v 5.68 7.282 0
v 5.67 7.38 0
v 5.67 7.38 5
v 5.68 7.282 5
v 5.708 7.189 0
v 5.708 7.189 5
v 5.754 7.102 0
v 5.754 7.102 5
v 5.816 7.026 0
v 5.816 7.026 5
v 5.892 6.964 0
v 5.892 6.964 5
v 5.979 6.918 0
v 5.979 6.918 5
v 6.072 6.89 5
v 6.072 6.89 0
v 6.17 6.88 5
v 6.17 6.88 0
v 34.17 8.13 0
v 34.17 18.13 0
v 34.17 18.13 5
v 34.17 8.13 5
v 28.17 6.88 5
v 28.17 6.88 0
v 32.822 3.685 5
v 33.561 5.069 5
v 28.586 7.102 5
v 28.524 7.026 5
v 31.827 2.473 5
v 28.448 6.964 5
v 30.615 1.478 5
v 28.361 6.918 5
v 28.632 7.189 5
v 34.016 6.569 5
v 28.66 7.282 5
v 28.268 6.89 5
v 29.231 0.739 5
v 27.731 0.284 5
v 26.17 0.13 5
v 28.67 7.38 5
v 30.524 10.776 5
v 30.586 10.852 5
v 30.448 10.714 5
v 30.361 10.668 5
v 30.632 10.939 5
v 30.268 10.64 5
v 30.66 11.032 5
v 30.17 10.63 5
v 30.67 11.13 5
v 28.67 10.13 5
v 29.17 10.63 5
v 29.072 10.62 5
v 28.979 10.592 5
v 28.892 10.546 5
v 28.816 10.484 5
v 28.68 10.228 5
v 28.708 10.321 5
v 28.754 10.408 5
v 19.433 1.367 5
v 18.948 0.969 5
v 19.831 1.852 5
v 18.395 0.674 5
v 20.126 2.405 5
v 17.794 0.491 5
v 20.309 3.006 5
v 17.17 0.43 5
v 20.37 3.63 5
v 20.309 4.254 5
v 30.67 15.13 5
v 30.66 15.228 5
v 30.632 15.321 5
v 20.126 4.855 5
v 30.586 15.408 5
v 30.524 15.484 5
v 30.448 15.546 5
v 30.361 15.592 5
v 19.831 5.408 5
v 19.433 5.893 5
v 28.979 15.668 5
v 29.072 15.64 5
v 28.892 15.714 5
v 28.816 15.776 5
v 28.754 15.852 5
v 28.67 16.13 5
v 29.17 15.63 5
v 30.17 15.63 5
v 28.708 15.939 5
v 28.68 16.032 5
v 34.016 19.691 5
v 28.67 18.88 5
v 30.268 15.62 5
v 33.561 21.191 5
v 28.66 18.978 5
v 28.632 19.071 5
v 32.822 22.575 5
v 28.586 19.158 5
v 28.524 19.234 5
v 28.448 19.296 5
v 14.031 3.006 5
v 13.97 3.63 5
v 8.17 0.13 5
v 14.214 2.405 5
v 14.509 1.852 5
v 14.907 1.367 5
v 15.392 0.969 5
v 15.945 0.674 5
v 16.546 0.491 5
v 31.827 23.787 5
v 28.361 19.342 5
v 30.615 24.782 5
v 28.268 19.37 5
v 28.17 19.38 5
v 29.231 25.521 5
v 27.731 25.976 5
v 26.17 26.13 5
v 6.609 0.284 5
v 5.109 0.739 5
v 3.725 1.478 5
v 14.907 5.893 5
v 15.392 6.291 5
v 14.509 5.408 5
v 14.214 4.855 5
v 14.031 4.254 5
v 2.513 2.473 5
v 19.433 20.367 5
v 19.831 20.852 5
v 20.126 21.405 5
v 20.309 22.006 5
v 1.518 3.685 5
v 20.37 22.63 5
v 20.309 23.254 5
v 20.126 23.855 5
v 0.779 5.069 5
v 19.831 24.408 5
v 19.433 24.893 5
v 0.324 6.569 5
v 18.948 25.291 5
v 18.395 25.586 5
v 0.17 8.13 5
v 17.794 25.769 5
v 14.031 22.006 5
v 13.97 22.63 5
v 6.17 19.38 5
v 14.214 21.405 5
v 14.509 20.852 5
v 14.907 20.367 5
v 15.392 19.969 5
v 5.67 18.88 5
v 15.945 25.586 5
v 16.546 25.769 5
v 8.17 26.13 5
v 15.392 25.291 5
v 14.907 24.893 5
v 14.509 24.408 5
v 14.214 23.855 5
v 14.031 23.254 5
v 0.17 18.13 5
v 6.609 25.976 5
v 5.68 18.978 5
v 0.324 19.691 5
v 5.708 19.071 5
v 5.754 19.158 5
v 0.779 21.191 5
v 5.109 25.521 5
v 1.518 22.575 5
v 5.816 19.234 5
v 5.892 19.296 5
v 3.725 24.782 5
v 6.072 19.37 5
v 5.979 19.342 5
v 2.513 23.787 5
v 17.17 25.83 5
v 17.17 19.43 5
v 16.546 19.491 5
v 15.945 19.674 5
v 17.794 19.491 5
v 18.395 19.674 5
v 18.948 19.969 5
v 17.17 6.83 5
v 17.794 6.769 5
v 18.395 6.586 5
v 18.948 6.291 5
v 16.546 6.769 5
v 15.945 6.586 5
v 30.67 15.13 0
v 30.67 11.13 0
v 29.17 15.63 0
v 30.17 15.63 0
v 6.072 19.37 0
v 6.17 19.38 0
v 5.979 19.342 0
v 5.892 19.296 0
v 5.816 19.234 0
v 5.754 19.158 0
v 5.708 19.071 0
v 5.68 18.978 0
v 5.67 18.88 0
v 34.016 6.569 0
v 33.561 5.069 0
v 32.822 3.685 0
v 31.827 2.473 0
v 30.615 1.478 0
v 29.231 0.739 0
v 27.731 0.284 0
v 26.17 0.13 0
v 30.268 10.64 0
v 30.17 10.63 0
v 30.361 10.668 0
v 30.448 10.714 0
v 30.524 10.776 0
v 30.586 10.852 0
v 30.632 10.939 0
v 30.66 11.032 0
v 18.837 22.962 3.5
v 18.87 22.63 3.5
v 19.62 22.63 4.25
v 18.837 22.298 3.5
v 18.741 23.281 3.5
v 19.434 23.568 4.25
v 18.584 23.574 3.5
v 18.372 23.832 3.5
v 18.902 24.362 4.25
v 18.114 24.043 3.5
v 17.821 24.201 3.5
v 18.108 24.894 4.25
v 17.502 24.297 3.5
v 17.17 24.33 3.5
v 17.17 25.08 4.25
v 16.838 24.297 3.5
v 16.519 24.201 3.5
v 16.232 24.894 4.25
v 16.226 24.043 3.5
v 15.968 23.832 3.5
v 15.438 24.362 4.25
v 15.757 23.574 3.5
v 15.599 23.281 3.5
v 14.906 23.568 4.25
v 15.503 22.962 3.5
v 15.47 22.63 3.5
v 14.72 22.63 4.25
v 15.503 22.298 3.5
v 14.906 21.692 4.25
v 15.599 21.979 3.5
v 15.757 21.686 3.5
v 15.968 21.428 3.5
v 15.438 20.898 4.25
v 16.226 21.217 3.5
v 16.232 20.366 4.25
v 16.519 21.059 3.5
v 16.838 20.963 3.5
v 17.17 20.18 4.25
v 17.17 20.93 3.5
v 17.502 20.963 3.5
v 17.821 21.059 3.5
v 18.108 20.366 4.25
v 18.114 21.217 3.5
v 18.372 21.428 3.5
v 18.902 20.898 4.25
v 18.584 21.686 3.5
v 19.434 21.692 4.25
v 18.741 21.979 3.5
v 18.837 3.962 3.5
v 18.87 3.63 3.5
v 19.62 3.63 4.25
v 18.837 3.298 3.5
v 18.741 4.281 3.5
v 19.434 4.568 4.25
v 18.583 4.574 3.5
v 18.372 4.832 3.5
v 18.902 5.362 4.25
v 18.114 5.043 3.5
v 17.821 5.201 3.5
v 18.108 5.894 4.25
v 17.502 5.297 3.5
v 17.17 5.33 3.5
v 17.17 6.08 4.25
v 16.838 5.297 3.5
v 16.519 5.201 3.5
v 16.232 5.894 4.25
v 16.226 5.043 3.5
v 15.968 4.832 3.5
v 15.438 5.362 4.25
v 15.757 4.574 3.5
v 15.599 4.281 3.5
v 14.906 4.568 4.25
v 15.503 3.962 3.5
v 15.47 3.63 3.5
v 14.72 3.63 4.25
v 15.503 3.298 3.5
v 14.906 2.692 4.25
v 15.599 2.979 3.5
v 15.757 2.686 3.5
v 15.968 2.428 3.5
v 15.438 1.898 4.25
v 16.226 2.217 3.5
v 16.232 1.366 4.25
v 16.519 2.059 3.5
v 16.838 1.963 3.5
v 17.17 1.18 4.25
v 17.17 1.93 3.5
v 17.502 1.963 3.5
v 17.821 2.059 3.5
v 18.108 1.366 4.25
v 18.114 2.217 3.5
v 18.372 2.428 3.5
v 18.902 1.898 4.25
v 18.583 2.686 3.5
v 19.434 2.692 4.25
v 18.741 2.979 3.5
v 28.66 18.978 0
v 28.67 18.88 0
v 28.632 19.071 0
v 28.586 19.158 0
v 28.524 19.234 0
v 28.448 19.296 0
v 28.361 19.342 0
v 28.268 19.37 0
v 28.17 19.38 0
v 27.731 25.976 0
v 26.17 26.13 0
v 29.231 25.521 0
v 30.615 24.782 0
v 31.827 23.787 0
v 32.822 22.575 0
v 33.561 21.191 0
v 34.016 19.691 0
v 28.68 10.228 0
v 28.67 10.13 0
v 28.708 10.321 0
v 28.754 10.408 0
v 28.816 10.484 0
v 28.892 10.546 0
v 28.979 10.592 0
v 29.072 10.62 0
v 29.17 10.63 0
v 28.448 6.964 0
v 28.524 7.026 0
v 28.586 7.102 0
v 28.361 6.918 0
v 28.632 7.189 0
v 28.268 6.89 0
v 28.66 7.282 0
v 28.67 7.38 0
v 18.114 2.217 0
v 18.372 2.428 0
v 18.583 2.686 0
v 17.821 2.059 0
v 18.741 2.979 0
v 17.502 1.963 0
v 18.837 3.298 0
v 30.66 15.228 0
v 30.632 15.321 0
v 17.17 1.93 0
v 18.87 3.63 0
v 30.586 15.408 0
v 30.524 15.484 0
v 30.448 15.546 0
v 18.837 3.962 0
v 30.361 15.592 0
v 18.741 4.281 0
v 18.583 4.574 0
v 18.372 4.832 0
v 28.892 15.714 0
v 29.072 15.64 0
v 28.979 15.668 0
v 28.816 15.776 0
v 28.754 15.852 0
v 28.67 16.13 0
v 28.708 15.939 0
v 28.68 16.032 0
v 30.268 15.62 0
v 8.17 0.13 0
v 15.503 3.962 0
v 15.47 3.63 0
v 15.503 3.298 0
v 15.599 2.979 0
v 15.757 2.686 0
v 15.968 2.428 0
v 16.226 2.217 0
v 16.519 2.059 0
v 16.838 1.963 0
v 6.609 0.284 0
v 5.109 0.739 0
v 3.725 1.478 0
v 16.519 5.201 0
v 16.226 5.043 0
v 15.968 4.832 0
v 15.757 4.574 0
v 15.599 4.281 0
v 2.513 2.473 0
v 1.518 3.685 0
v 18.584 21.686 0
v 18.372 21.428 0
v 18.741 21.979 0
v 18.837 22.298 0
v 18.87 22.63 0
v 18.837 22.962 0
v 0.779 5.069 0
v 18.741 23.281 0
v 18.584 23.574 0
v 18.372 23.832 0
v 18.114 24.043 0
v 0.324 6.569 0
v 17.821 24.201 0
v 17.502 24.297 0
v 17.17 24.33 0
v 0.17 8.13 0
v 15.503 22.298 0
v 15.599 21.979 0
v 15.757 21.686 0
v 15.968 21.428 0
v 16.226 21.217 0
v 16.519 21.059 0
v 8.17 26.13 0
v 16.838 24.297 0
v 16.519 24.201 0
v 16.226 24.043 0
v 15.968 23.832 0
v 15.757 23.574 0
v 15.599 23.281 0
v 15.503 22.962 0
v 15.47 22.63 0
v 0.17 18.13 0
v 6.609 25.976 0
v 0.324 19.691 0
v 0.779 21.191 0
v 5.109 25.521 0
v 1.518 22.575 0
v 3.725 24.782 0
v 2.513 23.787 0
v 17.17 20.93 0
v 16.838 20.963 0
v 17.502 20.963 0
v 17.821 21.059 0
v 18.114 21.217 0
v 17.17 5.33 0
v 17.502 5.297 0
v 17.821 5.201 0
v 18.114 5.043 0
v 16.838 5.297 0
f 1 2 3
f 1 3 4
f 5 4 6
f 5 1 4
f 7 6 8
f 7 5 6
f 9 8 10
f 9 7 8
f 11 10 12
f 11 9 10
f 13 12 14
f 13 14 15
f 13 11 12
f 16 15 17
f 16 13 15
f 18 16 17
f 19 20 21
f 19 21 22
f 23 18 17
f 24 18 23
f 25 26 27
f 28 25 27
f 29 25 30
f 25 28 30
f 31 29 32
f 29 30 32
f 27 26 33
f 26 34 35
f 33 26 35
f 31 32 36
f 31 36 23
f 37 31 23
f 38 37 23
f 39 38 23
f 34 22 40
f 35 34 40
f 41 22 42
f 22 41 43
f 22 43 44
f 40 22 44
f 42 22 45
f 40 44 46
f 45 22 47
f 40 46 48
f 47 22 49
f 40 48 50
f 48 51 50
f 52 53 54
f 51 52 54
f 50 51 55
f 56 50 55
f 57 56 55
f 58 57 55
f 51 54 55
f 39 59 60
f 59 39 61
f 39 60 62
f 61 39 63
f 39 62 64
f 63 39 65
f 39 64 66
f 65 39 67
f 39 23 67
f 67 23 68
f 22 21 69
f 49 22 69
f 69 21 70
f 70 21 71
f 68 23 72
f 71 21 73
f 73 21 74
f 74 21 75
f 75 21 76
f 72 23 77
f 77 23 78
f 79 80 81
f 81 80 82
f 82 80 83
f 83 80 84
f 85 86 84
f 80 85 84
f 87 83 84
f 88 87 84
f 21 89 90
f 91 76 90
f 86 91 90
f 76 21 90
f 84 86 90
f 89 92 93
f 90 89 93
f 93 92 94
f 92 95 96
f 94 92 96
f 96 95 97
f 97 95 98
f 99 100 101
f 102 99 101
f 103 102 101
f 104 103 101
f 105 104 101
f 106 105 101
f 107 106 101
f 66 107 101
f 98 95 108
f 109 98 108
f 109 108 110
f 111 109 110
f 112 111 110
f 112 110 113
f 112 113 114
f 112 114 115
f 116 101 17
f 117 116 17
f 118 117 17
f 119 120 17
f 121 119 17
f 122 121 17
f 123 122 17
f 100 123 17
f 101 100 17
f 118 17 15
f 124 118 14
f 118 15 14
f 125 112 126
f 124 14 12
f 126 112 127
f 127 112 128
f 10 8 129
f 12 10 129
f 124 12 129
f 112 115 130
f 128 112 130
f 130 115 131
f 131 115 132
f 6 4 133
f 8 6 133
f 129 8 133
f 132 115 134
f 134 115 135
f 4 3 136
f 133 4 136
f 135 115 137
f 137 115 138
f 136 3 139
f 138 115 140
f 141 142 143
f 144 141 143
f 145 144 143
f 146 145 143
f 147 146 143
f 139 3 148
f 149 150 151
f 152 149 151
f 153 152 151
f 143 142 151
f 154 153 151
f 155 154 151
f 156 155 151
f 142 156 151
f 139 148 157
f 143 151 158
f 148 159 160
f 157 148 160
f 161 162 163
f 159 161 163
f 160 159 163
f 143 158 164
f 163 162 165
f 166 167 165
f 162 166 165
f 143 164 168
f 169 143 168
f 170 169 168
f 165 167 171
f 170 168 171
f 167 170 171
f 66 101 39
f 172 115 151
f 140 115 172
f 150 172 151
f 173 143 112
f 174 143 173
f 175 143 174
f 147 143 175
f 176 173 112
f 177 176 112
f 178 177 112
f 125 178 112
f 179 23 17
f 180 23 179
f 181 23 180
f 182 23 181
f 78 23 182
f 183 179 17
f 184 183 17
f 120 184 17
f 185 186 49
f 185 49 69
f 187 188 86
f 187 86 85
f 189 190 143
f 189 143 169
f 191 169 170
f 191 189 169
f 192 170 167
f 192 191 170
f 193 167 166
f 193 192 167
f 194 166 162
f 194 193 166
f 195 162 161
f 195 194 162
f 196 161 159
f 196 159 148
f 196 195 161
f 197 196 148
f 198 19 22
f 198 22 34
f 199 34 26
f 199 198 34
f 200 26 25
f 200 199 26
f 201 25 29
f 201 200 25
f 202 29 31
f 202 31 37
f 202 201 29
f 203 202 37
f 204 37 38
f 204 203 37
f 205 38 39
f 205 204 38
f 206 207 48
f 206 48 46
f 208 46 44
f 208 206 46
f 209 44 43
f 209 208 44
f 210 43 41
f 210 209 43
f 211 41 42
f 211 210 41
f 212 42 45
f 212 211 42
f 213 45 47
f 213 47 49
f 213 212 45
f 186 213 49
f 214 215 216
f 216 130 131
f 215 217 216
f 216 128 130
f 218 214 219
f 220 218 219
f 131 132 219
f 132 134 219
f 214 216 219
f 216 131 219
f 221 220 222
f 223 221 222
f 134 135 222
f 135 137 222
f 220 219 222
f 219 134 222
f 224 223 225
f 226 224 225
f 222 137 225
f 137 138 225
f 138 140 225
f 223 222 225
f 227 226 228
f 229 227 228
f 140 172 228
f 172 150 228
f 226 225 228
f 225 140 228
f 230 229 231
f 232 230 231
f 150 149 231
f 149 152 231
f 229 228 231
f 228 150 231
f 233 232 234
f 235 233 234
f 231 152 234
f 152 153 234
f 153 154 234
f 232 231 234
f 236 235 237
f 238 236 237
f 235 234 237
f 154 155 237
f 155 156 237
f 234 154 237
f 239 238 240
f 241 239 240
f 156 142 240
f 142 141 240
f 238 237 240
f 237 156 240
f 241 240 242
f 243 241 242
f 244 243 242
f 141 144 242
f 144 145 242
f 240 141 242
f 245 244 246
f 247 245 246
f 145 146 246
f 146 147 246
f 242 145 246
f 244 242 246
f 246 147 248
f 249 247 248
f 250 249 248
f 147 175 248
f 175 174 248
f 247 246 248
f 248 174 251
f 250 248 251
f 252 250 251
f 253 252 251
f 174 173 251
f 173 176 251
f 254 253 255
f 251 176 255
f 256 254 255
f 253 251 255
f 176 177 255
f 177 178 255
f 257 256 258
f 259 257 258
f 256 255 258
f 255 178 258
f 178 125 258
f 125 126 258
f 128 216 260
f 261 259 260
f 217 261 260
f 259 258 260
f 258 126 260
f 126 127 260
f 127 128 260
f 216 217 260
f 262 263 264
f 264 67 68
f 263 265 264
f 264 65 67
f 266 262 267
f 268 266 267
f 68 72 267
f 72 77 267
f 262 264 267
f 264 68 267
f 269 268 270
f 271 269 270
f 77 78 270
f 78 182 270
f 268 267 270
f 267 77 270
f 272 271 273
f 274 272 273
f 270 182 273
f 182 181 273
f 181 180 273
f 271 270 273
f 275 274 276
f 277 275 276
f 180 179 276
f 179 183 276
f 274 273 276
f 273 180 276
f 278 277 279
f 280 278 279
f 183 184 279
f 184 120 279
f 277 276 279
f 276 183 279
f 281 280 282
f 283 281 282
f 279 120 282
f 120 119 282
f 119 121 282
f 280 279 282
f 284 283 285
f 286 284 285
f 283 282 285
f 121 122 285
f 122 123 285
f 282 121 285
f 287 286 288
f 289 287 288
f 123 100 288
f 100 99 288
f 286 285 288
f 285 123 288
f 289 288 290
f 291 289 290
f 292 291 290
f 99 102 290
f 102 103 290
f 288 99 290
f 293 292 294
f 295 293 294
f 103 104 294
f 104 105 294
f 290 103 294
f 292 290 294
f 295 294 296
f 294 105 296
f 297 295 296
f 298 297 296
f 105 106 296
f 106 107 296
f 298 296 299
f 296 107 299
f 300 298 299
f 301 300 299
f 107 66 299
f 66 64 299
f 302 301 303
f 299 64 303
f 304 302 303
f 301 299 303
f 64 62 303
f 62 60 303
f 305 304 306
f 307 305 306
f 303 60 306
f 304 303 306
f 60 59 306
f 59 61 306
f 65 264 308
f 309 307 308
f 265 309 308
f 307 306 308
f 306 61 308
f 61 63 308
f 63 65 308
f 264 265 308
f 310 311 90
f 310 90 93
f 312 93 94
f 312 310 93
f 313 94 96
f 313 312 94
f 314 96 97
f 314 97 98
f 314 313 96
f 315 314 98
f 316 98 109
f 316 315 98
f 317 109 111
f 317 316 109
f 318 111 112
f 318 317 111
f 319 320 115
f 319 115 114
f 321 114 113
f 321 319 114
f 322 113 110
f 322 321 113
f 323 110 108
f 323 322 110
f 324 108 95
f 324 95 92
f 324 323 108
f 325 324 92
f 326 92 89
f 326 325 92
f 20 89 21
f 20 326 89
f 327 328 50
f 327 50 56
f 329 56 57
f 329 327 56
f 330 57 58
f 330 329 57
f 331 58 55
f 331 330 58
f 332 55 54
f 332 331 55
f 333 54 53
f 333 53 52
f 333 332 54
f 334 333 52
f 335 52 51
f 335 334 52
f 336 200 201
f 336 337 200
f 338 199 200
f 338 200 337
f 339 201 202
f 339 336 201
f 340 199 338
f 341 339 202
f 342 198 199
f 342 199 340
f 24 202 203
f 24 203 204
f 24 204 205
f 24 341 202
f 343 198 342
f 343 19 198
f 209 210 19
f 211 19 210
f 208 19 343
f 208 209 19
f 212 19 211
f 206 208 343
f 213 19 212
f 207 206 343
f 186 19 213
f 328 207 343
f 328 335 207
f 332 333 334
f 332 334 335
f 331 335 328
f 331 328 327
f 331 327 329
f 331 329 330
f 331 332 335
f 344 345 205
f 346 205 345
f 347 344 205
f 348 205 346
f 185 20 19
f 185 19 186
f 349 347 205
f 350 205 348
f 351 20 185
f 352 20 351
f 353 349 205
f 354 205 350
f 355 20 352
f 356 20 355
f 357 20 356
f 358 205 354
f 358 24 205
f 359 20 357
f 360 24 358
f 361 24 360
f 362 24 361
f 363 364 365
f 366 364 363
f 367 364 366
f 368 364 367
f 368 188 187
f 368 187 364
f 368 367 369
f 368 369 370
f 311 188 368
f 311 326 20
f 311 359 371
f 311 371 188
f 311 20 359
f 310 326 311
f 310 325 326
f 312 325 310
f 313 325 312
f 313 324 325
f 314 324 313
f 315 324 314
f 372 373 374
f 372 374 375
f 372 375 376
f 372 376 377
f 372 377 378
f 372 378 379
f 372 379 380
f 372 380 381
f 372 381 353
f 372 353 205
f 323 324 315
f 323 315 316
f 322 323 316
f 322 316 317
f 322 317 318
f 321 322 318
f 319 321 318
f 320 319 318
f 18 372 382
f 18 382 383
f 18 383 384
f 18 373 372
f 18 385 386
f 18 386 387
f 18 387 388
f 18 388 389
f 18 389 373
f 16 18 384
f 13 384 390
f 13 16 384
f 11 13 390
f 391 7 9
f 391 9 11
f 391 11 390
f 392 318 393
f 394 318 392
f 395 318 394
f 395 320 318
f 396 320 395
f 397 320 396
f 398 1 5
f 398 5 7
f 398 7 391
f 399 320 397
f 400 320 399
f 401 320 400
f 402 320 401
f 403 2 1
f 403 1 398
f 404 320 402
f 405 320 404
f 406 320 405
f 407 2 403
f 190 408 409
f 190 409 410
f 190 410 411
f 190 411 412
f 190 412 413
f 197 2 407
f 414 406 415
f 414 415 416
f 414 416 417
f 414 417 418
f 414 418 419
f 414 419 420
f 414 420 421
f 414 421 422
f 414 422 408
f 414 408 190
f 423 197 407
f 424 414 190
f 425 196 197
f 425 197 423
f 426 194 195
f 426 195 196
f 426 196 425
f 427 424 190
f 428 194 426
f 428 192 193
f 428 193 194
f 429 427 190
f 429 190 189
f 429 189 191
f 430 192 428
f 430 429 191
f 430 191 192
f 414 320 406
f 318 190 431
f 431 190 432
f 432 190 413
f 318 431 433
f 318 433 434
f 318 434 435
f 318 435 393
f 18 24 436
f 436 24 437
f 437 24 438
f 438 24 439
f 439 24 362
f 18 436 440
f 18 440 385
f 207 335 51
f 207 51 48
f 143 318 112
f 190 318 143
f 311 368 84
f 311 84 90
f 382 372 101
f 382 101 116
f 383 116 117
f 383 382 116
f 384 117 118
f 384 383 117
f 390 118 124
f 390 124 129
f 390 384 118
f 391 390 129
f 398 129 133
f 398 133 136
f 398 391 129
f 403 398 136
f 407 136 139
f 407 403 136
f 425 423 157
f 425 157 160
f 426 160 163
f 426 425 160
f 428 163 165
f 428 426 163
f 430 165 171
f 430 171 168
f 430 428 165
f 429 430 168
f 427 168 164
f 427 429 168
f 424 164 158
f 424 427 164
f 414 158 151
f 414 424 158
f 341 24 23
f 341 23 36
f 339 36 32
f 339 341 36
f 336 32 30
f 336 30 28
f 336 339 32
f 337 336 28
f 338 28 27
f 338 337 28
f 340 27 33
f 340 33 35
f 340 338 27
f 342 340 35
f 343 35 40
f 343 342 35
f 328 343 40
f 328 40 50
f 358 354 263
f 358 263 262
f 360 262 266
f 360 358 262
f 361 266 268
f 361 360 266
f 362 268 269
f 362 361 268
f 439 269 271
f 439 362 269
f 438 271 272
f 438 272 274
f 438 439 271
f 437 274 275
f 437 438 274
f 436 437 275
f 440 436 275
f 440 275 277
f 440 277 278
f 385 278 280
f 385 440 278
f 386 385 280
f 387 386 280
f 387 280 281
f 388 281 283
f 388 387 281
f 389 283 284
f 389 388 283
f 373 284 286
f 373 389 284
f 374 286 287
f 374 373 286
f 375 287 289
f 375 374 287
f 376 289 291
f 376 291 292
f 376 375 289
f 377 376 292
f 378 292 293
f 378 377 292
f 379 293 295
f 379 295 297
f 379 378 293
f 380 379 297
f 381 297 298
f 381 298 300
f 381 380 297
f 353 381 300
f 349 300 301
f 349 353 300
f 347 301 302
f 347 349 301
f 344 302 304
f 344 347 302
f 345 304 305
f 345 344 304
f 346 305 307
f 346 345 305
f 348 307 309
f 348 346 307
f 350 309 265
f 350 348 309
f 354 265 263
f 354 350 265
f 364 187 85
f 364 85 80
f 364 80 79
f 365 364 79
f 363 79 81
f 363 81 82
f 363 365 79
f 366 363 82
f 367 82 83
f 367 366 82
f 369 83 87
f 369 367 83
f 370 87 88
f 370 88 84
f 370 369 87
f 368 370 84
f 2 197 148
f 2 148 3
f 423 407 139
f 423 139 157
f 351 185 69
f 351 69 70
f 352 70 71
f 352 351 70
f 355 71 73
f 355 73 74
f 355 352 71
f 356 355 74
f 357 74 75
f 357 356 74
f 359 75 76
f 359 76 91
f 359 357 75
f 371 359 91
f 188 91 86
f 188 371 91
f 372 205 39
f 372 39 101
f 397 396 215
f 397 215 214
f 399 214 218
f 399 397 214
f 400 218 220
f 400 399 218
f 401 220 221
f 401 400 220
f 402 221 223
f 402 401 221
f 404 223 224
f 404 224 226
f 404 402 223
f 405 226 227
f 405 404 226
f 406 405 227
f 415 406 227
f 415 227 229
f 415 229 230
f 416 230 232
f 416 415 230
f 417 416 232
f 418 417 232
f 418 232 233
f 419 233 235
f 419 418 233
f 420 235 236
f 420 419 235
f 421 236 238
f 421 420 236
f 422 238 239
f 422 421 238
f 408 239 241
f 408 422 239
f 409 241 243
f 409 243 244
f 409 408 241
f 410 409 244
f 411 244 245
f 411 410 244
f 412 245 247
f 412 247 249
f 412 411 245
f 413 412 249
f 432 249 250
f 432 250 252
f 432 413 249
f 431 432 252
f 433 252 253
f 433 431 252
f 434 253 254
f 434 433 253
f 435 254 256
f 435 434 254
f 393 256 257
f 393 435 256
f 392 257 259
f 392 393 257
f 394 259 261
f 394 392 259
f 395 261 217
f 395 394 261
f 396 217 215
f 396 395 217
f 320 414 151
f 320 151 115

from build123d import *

# Parameters (mm, degrees)
SKETCH1_R           = 1.699999809
SKETCH1_R_2         = 1.70000044
BOSS_EXTRUDE1_DEPTH = 5
CHAMFER1_SIZE       = 1.5


with BuildPart() as part:
    # Sketch1 → Boss-Extrude1 (new body)
    with BuildSketch(Plane.XY):
        with BuildLine():
            Line((34.170001984, 18.130024456), (34.170001984, 8.129999593))
            ThreePointArc((34.170001984, 8.129999593), (31.826856233, 2.473145343), (26.170001984, 0.129999593))
            Line((26.170001984, 0.129999593), (8.170027525, 0.129999593))
            ThreePointArc((8.170027525, 0.129999593), (2.513173276, 2.473145343), (0.170027525, 8.129999593))
            Line((0.170027525, 8.129999593), (0.170027525, 18.130024456))
            ThreePointArc((0.170027525, 18.130024456), (2.513173276, 23.786878706), (8.170027525, 26.130024456))
            Line((8.170027525, 26.130024456), (26.170001984, 26.130024456))
            ThreePointArc((26.170001984, 26.130024456), (31.826856233, 23.786878706), (34.170001984, 18.130024456))
        make_face()
        with Locations((17.17000103, 3.630000114)):
            Circle(SKETCH1_R, mode=Mode.SUBTRACT)
        with Locations((17.170001507, 22.630000114)):
            Circle(SKETCH1_R_2, mode=Mode.SUBTRACT)
        with BuildLine():
            Line((30.170001984, 15.629999161), (29.170001984, 15.629999161))
            ThreePointArc((29.170001984, 15.629999161), (28.816448593, 15.77644577), (28.670001984, 16.129999161))
            Line((28.670001984, 16.129999161), (28.670001984, 18.879999161))
            ThreePointArc((28.670001984, 18.879999161), (28.523555374, 19.233552551), (28.170001984, 19.379999161))
            Line((28.170001984, 19.379999161), (6.17000103, 19.379999161))
            ThreePointArc((6.17000103, 19.379999161), (5.816447639, 19.233552551), (5.67000103, 18.879999161))
            Line((5.67000103, 18.879999161), (5.67000103, 7.379999638))
            ThreePointArc((5.67000103, 7.379999638), (5.816447639, 7.026446247), (6.17000103, 6.879999638))
            Line((6.17000103, 6.879999638), (28.170001984, 6.879999638))
            ThreePointArc((28.170001984, 6.879999638), (28.523555374, 7.026446247), (28.670001984, 7.379999638))
            Line((28.670001984, 7.379999638), (28.670001984, 10.130000114))
            ThreePointArc((28.670001984, 10.130000114), (28.816448593, 10.483553505), (29.170001984, 10.630000114))
            Line((29.170001984, 10.630000114), (30.170001984, 10.630000114))
            ThreePointArc((30.170001984, 10.630000114), (30.523555374, 10.776446724), (30.670001984, 11.130000114))
            Line((30.670001984, 11.130000114), (30.670001984, 15.129999161))
            ThreePointArc((30.670001984, 15.129999161), (30.523555374, 15.483552551), (30.170001984, 15.629999161))
        make_face(mode=Mode.SUBTRACT)
    extrude(amount=BOSS_EXTRUDE1_DEPTH)

    # Chamfer1
    chamfer1_edges = [part.edges().sort_by_distance(p)[0] for p in [
        (15.470001221, 3.630000114, 5),
        (15.470001067, 22.630000114, 5),
    ]]
    chamfer(chamfer1_edges, length=CHAMFER1_SIZE)


solid = part.part
